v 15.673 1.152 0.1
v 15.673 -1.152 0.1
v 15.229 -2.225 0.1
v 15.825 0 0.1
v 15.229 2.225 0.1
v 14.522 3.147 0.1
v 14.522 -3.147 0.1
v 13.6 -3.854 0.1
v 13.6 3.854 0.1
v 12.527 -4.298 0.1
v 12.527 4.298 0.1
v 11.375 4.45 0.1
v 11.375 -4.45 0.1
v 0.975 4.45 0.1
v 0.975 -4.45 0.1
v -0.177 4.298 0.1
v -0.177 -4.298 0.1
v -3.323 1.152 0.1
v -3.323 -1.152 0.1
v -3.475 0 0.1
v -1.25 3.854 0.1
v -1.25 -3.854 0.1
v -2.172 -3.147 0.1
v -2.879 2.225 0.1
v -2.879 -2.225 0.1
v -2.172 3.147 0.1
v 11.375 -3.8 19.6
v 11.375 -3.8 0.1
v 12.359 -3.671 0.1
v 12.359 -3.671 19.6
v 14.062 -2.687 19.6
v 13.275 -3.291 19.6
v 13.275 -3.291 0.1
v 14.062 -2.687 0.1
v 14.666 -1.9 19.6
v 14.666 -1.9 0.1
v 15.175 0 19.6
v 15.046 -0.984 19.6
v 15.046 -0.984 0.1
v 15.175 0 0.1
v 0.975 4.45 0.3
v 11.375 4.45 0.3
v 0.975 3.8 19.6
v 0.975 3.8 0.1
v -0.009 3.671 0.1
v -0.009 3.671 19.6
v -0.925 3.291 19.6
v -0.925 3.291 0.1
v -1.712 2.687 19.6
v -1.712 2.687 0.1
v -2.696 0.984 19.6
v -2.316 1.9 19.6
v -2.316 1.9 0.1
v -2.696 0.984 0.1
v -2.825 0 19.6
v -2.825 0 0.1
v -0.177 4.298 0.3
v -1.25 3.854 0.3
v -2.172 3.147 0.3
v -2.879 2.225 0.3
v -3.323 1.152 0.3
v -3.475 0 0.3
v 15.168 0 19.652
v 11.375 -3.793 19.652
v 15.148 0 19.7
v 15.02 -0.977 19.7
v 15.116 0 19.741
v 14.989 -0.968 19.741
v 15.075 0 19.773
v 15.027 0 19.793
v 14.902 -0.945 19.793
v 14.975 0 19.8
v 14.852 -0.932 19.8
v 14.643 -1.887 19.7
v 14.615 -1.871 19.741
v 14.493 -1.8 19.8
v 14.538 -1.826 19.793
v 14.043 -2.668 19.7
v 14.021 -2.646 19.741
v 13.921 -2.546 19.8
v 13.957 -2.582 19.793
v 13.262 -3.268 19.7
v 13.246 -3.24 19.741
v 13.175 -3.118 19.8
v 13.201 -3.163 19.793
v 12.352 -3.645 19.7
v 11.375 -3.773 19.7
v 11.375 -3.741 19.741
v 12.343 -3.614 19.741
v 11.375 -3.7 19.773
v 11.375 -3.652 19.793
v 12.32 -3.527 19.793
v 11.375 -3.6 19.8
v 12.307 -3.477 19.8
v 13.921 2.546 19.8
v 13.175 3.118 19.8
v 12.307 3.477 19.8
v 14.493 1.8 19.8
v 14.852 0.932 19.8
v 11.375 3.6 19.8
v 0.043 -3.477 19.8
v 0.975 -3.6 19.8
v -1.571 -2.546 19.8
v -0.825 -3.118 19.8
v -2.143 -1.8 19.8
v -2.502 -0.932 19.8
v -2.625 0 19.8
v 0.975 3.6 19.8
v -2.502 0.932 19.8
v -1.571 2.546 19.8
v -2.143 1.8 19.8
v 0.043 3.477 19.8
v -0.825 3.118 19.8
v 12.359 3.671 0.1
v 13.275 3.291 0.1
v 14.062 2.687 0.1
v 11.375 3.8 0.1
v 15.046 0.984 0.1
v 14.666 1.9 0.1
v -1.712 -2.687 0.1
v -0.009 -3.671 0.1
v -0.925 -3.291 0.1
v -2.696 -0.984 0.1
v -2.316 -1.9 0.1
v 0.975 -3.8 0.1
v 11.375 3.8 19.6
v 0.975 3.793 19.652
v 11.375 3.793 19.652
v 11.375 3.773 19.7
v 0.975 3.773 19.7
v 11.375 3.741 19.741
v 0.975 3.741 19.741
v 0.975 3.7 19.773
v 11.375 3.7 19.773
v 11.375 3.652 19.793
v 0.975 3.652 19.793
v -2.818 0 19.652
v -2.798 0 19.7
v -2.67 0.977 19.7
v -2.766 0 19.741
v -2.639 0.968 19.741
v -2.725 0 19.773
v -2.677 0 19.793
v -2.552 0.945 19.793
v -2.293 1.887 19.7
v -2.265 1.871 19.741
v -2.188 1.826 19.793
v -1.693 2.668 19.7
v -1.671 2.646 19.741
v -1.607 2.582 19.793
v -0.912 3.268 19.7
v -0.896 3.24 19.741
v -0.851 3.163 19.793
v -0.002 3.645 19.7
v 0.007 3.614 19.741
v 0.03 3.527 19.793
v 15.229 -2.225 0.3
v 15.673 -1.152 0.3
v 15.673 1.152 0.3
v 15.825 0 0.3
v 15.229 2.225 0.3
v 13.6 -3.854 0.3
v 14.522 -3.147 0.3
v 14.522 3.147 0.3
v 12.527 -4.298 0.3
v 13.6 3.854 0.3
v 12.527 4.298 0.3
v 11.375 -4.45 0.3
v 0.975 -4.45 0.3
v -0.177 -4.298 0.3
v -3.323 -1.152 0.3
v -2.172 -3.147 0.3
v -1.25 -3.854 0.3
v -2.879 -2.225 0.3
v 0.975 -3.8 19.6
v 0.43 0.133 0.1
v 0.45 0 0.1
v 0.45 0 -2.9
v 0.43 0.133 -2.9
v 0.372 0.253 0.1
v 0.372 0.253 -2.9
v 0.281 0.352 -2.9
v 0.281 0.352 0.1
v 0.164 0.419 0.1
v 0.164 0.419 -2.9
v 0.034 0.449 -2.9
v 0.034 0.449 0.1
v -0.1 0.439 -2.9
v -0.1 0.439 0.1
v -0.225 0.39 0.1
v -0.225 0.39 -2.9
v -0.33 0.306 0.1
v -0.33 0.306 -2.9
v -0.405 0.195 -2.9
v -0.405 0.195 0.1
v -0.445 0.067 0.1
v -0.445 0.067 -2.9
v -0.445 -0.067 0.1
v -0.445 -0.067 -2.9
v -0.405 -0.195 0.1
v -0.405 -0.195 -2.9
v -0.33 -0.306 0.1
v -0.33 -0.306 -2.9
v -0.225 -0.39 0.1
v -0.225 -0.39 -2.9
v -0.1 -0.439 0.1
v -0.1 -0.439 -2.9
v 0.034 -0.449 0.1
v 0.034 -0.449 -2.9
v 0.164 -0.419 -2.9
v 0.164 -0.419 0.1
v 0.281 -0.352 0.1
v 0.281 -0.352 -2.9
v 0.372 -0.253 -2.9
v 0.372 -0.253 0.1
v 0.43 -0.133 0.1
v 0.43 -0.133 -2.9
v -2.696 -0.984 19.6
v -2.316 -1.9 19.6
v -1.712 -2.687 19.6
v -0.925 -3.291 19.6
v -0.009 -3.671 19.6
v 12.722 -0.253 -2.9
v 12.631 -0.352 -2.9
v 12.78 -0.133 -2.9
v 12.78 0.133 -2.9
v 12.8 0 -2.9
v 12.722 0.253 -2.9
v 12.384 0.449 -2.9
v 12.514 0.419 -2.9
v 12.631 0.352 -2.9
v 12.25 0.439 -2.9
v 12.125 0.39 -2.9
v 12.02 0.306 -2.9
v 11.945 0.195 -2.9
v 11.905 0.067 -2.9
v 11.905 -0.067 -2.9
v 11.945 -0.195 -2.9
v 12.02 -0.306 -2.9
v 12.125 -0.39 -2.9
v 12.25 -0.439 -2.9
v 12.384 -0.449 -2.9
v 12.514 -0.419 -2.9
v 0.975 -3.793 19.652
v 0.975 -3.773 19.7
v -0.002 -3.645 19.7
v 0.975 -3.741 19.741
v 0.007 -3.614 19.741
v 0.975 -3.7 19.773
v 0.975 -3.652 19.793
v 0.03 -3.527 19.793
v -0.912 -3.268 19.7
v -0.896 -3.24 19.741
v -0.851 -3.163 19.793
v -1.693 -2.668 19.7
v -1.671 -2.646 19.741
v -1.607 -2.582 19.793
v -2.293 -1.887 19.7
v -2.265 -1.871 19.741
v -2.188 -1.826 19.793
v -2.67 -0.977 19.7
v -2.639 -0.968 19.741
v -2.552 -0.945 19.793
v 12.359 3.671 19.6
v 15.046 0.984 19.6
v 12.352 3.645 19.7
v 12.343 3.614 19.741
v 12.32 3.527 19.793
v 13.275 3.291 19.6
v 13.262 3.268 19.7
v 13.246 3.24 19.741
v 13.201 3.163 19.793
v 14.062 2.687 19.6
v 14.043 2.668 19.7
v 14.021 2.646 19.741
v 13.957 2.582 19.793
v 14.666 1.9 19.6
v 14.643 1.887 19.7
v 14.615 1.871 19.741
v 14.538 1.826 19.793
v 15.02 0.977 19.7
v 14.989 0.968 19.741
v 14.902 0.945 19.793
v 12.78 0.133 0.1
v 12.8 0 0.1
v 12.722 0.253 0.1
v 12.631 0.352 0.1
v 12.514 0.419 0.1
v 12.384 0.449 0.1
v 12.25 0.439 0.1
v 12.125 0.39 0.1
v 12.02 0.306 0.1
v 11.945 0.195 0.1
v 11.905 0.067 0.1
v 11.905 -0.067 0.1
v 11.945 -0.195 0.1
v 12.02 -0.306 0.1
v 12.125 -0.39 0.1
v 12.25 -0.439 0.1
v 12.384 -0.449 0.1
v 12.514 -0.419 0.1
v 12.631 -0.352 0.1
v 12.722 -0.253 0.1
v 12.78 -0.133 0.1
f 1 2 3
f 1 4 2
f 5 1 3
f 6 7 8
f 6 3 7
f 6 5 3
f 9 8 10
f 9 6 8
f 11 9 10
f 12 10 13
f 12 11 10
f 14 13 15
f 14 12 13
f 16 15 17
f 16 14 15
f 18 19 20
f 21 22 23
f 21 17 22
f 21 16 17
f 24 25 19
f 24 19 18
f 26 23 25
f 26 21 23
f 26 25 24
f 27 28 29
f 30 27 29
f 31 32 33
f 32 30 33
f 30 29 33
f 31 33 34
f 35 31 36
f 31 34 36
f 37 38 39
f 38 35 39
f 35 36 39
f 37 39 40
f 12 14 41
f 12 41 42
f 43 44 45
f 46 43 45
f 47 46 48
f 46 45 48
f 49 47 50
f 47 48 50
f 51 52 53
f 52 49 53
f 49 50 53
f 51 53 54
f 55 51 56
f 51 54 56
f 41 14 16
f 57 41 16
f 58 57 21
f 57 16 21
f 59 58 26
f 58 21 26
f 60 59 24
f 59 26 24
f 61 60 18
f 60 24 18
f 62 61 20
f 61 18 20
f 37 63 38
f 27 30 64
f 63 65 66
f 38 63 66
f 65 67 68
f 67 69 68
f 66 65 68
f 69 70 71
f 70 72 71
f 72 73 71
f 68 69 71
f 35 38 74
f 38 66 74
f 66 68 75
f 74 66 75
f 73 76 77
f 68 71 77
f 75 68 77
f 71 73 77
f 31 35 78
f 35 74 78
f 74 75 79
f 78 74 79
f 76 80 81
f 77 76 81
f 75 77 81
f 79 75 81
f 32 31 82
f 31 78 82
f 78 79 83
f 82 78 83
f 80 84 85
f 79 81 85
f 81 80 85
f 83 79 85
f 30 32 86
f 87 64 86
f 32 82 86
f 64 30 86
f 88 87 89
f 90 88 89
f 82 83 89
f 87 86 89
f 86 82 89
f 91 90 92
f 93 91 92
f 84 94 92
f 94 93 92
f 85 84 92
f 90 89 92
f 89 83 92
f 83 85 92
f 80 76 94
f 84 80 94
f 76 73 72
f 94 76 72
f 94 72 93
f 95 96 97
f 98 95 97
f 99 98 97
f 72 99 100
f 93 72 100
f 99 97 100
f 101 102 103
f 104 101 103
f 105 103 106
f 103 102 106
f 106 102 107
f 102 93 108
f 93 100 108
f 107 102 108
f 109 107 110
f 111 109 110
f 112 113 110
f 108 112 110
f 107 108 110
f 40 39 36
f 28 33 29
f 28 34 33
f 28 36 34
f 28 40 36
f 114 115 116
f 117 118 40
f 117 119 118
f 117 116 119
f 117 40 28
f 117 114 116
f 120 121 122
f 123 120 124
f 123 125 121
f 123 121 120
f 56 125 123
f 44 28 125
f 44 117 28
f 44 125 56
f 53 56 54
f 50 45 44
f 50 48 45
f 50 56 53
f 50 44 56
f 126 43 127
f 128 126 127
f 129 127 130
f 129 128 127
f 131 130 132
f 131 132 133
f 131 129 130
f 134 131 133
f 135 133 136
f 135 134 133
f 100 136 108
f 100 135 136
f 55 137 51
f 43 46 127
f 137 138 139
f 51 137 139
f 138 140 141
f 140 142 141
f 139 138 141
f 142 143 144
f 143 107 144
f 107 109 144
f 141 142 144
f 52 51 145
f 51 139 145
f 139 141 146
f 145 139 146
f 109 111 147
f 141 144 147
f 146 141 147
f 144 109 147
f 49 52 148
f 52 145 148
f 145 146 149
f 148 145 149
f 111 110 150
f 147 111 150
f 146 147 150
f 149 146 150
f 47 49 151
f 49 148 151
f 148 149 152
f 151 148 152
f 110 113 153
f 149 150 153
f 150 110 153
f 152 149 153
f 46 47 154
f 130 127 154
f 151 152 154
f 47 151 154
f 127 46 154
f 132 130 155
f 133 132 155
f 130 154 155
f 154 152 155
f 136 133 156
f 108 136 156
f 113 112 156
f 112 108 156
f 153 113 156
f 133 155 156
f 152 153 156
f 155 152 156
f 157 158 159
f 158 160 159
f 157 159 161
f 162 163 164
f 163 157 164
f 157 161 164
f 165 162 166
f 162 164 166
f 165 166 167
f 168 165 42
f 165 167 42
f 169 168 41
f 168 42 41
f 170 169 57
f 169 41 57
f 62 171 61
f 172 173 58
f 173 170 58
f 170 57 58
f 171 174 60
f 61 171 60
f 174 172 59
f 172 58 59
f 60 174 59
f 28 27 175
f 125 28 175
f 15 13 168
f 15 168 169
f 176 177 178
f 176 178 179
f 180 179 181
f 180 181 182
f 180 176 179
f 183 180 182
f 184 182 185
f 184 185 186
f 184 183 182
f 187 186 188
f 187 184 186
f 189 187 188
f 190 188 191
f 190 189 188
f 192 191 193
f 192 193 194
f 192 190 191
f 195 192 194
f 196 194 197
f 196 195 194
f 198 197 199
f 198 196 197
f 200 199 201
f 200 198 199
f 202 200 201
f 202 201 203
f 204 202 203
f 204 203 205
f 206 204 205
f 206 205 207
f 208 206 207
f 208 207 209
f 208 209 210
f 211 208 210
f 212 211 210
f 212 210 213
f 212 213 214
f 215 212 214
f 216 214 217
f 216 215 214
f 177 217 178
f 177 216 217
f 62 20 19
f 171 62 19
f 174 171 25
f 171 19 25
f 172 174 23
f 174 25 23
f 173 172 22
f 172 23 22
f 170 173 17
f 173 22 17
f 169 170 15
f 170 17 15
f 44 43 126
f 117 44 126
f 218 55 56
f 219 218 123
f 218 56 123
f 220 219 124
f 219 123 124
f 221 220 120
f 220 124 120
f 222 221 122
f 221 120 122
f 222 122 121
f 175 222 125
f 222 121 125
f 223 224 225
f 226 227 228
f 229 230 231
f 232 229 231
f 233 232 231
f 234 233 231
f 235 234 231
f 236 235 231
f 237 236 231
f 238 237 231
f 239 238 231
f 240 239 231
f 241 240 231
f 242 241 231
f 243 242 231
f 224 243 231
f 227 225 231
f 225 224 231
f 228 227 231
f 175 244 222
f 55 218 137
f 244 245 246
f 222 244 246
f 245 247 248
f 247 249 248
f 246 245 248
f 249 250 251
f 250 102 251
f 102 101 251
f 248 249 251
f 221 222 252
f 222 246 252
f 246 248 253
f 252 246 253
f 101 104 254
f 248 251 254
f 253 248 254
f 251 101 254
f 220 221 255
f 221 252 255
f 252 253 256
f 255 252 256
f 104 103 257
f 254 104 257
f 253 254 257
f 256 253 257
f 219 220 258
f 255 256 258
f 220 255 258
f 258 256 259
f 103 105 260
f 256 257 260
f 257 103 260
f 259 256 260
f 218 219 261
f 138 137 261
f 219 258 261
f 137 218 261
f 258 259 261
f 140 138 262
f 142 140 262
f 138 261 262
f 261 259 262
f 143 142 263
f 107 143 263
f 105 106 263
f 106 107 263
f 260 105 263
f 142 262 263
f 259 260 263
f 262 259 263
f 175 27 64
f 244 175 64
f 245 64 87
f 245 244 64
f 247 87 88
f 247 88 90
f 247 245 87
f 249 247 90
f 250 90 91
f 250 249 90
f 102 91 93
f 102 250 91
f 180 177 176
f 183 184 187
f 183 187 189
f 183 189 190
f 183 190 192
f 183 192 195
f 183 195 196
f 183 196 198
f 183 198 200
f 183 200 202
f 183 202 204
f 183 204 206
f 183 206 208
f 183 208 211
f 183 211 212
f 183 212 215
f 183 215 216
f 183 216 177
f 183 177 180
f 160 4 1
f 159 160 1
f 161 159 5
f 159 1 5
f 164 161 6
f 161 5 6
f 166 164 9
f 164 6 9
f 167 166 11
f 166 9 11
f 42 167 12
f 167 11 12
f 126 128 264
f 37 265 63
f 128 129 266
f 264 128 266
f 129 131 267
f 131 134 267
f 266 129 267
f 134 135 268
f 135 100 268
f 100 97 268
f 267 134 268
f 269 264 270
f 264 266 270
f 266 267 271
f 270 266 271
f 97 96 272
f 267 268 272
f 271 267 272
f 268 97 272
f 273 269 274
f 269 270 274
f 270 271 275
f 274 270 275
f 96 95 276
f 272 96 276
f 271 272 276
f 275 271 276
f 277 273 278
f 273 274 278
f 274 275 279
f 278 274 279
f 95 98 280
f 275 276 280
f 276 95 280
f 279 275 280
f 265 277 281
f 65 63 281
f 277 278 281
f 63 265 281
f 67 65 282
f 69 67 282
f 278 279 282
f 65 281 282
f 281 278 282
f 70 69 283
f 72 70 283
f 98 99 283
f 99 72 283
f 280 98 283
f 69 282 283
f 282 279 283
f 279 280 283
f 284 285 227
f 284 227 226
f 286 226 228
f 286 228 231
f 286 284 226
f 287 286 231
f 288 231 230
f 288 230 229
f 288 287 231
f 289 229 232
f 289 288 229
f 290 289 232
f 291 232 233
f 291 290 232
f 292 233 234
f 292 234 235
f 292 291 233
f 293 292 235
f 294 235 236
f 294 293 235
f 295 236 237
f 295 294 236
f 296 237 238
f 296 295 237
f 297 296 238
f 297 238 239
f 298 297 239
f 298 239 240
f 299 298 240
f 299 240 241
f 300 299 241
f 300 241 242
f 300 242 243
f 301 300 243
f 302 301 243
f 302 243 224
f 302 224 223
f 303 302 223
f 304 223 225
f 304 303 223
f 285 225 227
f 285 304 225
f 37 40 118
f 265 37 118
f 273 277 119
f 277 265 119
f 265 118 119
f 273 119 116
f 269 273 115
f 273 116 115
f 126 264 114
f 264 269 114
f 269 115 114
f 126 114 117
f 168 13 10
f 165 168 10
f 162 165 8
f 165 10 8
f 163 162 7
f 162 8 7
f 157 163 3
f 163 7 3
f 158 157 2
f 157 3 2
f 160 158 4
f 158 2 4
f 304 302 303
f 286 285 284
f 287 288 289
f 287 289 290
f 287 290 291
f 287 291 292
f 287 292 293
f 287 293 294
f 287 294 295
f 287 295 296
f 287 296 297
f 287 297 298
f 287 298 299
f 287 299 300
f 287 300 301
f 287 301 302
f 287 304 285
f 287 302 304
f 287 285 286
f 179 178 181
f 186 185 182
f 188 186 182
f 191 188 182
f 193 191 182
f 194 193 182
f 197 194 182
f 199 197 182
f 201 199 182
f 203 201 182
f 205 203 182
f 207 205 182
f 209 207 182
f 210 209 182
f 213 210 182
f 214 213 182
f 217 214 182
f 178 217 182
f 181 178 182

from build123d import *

# Parameters (mm, degrees)
SKETCH_R     = 0.45
PAD_DEPTH    = 3
PAD001_DEPTH = 0.2
PAD002_DEPTH = 19.7
FILLET_R     = 0.2


with BuildPart() as pad:
    # Sketch → Pad (new body)
    with BuildSketch(Plane.XY.offset(0.1)):
        Circle(SKETCH_R)
        with Locations((12.35, 0)):
            Circle(SKETCH_R)
    extrude(amount=-PAD_DEPTH)


with BuildPart() as pad001:
    # Sketch001 → Pad001 (new body)
    with BuildSketch(Plane.XY.offset(0.1)):
        with BuildLine():
            Line((0.975, 4.45), (11.375, 4.45))
            ThreePointArc((15.825, 0), (14.521625, 3.146625), (11.375, 4.45))
            ThreePointArc((11.375, -4.45), (14.521625, -3.146625), (15.825, 0))
            Line((11.375, -4.45), (0.975, -4.45))
            ThreePointArc((-3.475, 0), (-2.171625, -3.146625), (0.975, -4.45))
            ThreePointArc((0.975, 4.45), (-2.171625, 3.146625), (-3.475, 0))
        make_face()
    extrude(amount=PAD001_DEPTH)


with BuildPart() as fillet_body:
    # Sketch003 → Pad002 (new body)
    with BuildSketch(Plane.XY.offset(0.1)):
        with BuildLine():
            Line((0.975, 3.8), (11.375, 3.8))
            ThreePointArc((15.175, 0), (14.062006, 2.687006), (11.375, 3.8))
            ThreePointArc((11.375, -3.8), (14.062006, -2.687006), (15.175, 0))
            Line((11.375, -3.8), (0.975, -3.8))
            ThreePointArc((-2.825, 0), (-1.712006, -2.687006), (0.975, -3.8))
            ThreePointArc((0.975, 3.8), (-1.712006, 2.687006), (-2.825, 0))
        make_face()
    extrude(amount=PAD002_DEPTH)

    # Fillet
    fillet_edges = [fillet_body.edges().sort_by_distance(p)[0] for p in [
        (6.175, 3.8, 19.8),
        (-1.712006, 2.687006, 19.8),
        (-1.712006, -2.687006, 19.8),
        (6.175, -3.8, 19.8),
        (14.062006, -2.687006, 19.8),
        (14.062006, 2.687006, 19.8),
    ]]
    fillet(fillet_edges, radius=FILLET_R)


solid = Compound([pad.part, pad001.part, fillet_body.part])
